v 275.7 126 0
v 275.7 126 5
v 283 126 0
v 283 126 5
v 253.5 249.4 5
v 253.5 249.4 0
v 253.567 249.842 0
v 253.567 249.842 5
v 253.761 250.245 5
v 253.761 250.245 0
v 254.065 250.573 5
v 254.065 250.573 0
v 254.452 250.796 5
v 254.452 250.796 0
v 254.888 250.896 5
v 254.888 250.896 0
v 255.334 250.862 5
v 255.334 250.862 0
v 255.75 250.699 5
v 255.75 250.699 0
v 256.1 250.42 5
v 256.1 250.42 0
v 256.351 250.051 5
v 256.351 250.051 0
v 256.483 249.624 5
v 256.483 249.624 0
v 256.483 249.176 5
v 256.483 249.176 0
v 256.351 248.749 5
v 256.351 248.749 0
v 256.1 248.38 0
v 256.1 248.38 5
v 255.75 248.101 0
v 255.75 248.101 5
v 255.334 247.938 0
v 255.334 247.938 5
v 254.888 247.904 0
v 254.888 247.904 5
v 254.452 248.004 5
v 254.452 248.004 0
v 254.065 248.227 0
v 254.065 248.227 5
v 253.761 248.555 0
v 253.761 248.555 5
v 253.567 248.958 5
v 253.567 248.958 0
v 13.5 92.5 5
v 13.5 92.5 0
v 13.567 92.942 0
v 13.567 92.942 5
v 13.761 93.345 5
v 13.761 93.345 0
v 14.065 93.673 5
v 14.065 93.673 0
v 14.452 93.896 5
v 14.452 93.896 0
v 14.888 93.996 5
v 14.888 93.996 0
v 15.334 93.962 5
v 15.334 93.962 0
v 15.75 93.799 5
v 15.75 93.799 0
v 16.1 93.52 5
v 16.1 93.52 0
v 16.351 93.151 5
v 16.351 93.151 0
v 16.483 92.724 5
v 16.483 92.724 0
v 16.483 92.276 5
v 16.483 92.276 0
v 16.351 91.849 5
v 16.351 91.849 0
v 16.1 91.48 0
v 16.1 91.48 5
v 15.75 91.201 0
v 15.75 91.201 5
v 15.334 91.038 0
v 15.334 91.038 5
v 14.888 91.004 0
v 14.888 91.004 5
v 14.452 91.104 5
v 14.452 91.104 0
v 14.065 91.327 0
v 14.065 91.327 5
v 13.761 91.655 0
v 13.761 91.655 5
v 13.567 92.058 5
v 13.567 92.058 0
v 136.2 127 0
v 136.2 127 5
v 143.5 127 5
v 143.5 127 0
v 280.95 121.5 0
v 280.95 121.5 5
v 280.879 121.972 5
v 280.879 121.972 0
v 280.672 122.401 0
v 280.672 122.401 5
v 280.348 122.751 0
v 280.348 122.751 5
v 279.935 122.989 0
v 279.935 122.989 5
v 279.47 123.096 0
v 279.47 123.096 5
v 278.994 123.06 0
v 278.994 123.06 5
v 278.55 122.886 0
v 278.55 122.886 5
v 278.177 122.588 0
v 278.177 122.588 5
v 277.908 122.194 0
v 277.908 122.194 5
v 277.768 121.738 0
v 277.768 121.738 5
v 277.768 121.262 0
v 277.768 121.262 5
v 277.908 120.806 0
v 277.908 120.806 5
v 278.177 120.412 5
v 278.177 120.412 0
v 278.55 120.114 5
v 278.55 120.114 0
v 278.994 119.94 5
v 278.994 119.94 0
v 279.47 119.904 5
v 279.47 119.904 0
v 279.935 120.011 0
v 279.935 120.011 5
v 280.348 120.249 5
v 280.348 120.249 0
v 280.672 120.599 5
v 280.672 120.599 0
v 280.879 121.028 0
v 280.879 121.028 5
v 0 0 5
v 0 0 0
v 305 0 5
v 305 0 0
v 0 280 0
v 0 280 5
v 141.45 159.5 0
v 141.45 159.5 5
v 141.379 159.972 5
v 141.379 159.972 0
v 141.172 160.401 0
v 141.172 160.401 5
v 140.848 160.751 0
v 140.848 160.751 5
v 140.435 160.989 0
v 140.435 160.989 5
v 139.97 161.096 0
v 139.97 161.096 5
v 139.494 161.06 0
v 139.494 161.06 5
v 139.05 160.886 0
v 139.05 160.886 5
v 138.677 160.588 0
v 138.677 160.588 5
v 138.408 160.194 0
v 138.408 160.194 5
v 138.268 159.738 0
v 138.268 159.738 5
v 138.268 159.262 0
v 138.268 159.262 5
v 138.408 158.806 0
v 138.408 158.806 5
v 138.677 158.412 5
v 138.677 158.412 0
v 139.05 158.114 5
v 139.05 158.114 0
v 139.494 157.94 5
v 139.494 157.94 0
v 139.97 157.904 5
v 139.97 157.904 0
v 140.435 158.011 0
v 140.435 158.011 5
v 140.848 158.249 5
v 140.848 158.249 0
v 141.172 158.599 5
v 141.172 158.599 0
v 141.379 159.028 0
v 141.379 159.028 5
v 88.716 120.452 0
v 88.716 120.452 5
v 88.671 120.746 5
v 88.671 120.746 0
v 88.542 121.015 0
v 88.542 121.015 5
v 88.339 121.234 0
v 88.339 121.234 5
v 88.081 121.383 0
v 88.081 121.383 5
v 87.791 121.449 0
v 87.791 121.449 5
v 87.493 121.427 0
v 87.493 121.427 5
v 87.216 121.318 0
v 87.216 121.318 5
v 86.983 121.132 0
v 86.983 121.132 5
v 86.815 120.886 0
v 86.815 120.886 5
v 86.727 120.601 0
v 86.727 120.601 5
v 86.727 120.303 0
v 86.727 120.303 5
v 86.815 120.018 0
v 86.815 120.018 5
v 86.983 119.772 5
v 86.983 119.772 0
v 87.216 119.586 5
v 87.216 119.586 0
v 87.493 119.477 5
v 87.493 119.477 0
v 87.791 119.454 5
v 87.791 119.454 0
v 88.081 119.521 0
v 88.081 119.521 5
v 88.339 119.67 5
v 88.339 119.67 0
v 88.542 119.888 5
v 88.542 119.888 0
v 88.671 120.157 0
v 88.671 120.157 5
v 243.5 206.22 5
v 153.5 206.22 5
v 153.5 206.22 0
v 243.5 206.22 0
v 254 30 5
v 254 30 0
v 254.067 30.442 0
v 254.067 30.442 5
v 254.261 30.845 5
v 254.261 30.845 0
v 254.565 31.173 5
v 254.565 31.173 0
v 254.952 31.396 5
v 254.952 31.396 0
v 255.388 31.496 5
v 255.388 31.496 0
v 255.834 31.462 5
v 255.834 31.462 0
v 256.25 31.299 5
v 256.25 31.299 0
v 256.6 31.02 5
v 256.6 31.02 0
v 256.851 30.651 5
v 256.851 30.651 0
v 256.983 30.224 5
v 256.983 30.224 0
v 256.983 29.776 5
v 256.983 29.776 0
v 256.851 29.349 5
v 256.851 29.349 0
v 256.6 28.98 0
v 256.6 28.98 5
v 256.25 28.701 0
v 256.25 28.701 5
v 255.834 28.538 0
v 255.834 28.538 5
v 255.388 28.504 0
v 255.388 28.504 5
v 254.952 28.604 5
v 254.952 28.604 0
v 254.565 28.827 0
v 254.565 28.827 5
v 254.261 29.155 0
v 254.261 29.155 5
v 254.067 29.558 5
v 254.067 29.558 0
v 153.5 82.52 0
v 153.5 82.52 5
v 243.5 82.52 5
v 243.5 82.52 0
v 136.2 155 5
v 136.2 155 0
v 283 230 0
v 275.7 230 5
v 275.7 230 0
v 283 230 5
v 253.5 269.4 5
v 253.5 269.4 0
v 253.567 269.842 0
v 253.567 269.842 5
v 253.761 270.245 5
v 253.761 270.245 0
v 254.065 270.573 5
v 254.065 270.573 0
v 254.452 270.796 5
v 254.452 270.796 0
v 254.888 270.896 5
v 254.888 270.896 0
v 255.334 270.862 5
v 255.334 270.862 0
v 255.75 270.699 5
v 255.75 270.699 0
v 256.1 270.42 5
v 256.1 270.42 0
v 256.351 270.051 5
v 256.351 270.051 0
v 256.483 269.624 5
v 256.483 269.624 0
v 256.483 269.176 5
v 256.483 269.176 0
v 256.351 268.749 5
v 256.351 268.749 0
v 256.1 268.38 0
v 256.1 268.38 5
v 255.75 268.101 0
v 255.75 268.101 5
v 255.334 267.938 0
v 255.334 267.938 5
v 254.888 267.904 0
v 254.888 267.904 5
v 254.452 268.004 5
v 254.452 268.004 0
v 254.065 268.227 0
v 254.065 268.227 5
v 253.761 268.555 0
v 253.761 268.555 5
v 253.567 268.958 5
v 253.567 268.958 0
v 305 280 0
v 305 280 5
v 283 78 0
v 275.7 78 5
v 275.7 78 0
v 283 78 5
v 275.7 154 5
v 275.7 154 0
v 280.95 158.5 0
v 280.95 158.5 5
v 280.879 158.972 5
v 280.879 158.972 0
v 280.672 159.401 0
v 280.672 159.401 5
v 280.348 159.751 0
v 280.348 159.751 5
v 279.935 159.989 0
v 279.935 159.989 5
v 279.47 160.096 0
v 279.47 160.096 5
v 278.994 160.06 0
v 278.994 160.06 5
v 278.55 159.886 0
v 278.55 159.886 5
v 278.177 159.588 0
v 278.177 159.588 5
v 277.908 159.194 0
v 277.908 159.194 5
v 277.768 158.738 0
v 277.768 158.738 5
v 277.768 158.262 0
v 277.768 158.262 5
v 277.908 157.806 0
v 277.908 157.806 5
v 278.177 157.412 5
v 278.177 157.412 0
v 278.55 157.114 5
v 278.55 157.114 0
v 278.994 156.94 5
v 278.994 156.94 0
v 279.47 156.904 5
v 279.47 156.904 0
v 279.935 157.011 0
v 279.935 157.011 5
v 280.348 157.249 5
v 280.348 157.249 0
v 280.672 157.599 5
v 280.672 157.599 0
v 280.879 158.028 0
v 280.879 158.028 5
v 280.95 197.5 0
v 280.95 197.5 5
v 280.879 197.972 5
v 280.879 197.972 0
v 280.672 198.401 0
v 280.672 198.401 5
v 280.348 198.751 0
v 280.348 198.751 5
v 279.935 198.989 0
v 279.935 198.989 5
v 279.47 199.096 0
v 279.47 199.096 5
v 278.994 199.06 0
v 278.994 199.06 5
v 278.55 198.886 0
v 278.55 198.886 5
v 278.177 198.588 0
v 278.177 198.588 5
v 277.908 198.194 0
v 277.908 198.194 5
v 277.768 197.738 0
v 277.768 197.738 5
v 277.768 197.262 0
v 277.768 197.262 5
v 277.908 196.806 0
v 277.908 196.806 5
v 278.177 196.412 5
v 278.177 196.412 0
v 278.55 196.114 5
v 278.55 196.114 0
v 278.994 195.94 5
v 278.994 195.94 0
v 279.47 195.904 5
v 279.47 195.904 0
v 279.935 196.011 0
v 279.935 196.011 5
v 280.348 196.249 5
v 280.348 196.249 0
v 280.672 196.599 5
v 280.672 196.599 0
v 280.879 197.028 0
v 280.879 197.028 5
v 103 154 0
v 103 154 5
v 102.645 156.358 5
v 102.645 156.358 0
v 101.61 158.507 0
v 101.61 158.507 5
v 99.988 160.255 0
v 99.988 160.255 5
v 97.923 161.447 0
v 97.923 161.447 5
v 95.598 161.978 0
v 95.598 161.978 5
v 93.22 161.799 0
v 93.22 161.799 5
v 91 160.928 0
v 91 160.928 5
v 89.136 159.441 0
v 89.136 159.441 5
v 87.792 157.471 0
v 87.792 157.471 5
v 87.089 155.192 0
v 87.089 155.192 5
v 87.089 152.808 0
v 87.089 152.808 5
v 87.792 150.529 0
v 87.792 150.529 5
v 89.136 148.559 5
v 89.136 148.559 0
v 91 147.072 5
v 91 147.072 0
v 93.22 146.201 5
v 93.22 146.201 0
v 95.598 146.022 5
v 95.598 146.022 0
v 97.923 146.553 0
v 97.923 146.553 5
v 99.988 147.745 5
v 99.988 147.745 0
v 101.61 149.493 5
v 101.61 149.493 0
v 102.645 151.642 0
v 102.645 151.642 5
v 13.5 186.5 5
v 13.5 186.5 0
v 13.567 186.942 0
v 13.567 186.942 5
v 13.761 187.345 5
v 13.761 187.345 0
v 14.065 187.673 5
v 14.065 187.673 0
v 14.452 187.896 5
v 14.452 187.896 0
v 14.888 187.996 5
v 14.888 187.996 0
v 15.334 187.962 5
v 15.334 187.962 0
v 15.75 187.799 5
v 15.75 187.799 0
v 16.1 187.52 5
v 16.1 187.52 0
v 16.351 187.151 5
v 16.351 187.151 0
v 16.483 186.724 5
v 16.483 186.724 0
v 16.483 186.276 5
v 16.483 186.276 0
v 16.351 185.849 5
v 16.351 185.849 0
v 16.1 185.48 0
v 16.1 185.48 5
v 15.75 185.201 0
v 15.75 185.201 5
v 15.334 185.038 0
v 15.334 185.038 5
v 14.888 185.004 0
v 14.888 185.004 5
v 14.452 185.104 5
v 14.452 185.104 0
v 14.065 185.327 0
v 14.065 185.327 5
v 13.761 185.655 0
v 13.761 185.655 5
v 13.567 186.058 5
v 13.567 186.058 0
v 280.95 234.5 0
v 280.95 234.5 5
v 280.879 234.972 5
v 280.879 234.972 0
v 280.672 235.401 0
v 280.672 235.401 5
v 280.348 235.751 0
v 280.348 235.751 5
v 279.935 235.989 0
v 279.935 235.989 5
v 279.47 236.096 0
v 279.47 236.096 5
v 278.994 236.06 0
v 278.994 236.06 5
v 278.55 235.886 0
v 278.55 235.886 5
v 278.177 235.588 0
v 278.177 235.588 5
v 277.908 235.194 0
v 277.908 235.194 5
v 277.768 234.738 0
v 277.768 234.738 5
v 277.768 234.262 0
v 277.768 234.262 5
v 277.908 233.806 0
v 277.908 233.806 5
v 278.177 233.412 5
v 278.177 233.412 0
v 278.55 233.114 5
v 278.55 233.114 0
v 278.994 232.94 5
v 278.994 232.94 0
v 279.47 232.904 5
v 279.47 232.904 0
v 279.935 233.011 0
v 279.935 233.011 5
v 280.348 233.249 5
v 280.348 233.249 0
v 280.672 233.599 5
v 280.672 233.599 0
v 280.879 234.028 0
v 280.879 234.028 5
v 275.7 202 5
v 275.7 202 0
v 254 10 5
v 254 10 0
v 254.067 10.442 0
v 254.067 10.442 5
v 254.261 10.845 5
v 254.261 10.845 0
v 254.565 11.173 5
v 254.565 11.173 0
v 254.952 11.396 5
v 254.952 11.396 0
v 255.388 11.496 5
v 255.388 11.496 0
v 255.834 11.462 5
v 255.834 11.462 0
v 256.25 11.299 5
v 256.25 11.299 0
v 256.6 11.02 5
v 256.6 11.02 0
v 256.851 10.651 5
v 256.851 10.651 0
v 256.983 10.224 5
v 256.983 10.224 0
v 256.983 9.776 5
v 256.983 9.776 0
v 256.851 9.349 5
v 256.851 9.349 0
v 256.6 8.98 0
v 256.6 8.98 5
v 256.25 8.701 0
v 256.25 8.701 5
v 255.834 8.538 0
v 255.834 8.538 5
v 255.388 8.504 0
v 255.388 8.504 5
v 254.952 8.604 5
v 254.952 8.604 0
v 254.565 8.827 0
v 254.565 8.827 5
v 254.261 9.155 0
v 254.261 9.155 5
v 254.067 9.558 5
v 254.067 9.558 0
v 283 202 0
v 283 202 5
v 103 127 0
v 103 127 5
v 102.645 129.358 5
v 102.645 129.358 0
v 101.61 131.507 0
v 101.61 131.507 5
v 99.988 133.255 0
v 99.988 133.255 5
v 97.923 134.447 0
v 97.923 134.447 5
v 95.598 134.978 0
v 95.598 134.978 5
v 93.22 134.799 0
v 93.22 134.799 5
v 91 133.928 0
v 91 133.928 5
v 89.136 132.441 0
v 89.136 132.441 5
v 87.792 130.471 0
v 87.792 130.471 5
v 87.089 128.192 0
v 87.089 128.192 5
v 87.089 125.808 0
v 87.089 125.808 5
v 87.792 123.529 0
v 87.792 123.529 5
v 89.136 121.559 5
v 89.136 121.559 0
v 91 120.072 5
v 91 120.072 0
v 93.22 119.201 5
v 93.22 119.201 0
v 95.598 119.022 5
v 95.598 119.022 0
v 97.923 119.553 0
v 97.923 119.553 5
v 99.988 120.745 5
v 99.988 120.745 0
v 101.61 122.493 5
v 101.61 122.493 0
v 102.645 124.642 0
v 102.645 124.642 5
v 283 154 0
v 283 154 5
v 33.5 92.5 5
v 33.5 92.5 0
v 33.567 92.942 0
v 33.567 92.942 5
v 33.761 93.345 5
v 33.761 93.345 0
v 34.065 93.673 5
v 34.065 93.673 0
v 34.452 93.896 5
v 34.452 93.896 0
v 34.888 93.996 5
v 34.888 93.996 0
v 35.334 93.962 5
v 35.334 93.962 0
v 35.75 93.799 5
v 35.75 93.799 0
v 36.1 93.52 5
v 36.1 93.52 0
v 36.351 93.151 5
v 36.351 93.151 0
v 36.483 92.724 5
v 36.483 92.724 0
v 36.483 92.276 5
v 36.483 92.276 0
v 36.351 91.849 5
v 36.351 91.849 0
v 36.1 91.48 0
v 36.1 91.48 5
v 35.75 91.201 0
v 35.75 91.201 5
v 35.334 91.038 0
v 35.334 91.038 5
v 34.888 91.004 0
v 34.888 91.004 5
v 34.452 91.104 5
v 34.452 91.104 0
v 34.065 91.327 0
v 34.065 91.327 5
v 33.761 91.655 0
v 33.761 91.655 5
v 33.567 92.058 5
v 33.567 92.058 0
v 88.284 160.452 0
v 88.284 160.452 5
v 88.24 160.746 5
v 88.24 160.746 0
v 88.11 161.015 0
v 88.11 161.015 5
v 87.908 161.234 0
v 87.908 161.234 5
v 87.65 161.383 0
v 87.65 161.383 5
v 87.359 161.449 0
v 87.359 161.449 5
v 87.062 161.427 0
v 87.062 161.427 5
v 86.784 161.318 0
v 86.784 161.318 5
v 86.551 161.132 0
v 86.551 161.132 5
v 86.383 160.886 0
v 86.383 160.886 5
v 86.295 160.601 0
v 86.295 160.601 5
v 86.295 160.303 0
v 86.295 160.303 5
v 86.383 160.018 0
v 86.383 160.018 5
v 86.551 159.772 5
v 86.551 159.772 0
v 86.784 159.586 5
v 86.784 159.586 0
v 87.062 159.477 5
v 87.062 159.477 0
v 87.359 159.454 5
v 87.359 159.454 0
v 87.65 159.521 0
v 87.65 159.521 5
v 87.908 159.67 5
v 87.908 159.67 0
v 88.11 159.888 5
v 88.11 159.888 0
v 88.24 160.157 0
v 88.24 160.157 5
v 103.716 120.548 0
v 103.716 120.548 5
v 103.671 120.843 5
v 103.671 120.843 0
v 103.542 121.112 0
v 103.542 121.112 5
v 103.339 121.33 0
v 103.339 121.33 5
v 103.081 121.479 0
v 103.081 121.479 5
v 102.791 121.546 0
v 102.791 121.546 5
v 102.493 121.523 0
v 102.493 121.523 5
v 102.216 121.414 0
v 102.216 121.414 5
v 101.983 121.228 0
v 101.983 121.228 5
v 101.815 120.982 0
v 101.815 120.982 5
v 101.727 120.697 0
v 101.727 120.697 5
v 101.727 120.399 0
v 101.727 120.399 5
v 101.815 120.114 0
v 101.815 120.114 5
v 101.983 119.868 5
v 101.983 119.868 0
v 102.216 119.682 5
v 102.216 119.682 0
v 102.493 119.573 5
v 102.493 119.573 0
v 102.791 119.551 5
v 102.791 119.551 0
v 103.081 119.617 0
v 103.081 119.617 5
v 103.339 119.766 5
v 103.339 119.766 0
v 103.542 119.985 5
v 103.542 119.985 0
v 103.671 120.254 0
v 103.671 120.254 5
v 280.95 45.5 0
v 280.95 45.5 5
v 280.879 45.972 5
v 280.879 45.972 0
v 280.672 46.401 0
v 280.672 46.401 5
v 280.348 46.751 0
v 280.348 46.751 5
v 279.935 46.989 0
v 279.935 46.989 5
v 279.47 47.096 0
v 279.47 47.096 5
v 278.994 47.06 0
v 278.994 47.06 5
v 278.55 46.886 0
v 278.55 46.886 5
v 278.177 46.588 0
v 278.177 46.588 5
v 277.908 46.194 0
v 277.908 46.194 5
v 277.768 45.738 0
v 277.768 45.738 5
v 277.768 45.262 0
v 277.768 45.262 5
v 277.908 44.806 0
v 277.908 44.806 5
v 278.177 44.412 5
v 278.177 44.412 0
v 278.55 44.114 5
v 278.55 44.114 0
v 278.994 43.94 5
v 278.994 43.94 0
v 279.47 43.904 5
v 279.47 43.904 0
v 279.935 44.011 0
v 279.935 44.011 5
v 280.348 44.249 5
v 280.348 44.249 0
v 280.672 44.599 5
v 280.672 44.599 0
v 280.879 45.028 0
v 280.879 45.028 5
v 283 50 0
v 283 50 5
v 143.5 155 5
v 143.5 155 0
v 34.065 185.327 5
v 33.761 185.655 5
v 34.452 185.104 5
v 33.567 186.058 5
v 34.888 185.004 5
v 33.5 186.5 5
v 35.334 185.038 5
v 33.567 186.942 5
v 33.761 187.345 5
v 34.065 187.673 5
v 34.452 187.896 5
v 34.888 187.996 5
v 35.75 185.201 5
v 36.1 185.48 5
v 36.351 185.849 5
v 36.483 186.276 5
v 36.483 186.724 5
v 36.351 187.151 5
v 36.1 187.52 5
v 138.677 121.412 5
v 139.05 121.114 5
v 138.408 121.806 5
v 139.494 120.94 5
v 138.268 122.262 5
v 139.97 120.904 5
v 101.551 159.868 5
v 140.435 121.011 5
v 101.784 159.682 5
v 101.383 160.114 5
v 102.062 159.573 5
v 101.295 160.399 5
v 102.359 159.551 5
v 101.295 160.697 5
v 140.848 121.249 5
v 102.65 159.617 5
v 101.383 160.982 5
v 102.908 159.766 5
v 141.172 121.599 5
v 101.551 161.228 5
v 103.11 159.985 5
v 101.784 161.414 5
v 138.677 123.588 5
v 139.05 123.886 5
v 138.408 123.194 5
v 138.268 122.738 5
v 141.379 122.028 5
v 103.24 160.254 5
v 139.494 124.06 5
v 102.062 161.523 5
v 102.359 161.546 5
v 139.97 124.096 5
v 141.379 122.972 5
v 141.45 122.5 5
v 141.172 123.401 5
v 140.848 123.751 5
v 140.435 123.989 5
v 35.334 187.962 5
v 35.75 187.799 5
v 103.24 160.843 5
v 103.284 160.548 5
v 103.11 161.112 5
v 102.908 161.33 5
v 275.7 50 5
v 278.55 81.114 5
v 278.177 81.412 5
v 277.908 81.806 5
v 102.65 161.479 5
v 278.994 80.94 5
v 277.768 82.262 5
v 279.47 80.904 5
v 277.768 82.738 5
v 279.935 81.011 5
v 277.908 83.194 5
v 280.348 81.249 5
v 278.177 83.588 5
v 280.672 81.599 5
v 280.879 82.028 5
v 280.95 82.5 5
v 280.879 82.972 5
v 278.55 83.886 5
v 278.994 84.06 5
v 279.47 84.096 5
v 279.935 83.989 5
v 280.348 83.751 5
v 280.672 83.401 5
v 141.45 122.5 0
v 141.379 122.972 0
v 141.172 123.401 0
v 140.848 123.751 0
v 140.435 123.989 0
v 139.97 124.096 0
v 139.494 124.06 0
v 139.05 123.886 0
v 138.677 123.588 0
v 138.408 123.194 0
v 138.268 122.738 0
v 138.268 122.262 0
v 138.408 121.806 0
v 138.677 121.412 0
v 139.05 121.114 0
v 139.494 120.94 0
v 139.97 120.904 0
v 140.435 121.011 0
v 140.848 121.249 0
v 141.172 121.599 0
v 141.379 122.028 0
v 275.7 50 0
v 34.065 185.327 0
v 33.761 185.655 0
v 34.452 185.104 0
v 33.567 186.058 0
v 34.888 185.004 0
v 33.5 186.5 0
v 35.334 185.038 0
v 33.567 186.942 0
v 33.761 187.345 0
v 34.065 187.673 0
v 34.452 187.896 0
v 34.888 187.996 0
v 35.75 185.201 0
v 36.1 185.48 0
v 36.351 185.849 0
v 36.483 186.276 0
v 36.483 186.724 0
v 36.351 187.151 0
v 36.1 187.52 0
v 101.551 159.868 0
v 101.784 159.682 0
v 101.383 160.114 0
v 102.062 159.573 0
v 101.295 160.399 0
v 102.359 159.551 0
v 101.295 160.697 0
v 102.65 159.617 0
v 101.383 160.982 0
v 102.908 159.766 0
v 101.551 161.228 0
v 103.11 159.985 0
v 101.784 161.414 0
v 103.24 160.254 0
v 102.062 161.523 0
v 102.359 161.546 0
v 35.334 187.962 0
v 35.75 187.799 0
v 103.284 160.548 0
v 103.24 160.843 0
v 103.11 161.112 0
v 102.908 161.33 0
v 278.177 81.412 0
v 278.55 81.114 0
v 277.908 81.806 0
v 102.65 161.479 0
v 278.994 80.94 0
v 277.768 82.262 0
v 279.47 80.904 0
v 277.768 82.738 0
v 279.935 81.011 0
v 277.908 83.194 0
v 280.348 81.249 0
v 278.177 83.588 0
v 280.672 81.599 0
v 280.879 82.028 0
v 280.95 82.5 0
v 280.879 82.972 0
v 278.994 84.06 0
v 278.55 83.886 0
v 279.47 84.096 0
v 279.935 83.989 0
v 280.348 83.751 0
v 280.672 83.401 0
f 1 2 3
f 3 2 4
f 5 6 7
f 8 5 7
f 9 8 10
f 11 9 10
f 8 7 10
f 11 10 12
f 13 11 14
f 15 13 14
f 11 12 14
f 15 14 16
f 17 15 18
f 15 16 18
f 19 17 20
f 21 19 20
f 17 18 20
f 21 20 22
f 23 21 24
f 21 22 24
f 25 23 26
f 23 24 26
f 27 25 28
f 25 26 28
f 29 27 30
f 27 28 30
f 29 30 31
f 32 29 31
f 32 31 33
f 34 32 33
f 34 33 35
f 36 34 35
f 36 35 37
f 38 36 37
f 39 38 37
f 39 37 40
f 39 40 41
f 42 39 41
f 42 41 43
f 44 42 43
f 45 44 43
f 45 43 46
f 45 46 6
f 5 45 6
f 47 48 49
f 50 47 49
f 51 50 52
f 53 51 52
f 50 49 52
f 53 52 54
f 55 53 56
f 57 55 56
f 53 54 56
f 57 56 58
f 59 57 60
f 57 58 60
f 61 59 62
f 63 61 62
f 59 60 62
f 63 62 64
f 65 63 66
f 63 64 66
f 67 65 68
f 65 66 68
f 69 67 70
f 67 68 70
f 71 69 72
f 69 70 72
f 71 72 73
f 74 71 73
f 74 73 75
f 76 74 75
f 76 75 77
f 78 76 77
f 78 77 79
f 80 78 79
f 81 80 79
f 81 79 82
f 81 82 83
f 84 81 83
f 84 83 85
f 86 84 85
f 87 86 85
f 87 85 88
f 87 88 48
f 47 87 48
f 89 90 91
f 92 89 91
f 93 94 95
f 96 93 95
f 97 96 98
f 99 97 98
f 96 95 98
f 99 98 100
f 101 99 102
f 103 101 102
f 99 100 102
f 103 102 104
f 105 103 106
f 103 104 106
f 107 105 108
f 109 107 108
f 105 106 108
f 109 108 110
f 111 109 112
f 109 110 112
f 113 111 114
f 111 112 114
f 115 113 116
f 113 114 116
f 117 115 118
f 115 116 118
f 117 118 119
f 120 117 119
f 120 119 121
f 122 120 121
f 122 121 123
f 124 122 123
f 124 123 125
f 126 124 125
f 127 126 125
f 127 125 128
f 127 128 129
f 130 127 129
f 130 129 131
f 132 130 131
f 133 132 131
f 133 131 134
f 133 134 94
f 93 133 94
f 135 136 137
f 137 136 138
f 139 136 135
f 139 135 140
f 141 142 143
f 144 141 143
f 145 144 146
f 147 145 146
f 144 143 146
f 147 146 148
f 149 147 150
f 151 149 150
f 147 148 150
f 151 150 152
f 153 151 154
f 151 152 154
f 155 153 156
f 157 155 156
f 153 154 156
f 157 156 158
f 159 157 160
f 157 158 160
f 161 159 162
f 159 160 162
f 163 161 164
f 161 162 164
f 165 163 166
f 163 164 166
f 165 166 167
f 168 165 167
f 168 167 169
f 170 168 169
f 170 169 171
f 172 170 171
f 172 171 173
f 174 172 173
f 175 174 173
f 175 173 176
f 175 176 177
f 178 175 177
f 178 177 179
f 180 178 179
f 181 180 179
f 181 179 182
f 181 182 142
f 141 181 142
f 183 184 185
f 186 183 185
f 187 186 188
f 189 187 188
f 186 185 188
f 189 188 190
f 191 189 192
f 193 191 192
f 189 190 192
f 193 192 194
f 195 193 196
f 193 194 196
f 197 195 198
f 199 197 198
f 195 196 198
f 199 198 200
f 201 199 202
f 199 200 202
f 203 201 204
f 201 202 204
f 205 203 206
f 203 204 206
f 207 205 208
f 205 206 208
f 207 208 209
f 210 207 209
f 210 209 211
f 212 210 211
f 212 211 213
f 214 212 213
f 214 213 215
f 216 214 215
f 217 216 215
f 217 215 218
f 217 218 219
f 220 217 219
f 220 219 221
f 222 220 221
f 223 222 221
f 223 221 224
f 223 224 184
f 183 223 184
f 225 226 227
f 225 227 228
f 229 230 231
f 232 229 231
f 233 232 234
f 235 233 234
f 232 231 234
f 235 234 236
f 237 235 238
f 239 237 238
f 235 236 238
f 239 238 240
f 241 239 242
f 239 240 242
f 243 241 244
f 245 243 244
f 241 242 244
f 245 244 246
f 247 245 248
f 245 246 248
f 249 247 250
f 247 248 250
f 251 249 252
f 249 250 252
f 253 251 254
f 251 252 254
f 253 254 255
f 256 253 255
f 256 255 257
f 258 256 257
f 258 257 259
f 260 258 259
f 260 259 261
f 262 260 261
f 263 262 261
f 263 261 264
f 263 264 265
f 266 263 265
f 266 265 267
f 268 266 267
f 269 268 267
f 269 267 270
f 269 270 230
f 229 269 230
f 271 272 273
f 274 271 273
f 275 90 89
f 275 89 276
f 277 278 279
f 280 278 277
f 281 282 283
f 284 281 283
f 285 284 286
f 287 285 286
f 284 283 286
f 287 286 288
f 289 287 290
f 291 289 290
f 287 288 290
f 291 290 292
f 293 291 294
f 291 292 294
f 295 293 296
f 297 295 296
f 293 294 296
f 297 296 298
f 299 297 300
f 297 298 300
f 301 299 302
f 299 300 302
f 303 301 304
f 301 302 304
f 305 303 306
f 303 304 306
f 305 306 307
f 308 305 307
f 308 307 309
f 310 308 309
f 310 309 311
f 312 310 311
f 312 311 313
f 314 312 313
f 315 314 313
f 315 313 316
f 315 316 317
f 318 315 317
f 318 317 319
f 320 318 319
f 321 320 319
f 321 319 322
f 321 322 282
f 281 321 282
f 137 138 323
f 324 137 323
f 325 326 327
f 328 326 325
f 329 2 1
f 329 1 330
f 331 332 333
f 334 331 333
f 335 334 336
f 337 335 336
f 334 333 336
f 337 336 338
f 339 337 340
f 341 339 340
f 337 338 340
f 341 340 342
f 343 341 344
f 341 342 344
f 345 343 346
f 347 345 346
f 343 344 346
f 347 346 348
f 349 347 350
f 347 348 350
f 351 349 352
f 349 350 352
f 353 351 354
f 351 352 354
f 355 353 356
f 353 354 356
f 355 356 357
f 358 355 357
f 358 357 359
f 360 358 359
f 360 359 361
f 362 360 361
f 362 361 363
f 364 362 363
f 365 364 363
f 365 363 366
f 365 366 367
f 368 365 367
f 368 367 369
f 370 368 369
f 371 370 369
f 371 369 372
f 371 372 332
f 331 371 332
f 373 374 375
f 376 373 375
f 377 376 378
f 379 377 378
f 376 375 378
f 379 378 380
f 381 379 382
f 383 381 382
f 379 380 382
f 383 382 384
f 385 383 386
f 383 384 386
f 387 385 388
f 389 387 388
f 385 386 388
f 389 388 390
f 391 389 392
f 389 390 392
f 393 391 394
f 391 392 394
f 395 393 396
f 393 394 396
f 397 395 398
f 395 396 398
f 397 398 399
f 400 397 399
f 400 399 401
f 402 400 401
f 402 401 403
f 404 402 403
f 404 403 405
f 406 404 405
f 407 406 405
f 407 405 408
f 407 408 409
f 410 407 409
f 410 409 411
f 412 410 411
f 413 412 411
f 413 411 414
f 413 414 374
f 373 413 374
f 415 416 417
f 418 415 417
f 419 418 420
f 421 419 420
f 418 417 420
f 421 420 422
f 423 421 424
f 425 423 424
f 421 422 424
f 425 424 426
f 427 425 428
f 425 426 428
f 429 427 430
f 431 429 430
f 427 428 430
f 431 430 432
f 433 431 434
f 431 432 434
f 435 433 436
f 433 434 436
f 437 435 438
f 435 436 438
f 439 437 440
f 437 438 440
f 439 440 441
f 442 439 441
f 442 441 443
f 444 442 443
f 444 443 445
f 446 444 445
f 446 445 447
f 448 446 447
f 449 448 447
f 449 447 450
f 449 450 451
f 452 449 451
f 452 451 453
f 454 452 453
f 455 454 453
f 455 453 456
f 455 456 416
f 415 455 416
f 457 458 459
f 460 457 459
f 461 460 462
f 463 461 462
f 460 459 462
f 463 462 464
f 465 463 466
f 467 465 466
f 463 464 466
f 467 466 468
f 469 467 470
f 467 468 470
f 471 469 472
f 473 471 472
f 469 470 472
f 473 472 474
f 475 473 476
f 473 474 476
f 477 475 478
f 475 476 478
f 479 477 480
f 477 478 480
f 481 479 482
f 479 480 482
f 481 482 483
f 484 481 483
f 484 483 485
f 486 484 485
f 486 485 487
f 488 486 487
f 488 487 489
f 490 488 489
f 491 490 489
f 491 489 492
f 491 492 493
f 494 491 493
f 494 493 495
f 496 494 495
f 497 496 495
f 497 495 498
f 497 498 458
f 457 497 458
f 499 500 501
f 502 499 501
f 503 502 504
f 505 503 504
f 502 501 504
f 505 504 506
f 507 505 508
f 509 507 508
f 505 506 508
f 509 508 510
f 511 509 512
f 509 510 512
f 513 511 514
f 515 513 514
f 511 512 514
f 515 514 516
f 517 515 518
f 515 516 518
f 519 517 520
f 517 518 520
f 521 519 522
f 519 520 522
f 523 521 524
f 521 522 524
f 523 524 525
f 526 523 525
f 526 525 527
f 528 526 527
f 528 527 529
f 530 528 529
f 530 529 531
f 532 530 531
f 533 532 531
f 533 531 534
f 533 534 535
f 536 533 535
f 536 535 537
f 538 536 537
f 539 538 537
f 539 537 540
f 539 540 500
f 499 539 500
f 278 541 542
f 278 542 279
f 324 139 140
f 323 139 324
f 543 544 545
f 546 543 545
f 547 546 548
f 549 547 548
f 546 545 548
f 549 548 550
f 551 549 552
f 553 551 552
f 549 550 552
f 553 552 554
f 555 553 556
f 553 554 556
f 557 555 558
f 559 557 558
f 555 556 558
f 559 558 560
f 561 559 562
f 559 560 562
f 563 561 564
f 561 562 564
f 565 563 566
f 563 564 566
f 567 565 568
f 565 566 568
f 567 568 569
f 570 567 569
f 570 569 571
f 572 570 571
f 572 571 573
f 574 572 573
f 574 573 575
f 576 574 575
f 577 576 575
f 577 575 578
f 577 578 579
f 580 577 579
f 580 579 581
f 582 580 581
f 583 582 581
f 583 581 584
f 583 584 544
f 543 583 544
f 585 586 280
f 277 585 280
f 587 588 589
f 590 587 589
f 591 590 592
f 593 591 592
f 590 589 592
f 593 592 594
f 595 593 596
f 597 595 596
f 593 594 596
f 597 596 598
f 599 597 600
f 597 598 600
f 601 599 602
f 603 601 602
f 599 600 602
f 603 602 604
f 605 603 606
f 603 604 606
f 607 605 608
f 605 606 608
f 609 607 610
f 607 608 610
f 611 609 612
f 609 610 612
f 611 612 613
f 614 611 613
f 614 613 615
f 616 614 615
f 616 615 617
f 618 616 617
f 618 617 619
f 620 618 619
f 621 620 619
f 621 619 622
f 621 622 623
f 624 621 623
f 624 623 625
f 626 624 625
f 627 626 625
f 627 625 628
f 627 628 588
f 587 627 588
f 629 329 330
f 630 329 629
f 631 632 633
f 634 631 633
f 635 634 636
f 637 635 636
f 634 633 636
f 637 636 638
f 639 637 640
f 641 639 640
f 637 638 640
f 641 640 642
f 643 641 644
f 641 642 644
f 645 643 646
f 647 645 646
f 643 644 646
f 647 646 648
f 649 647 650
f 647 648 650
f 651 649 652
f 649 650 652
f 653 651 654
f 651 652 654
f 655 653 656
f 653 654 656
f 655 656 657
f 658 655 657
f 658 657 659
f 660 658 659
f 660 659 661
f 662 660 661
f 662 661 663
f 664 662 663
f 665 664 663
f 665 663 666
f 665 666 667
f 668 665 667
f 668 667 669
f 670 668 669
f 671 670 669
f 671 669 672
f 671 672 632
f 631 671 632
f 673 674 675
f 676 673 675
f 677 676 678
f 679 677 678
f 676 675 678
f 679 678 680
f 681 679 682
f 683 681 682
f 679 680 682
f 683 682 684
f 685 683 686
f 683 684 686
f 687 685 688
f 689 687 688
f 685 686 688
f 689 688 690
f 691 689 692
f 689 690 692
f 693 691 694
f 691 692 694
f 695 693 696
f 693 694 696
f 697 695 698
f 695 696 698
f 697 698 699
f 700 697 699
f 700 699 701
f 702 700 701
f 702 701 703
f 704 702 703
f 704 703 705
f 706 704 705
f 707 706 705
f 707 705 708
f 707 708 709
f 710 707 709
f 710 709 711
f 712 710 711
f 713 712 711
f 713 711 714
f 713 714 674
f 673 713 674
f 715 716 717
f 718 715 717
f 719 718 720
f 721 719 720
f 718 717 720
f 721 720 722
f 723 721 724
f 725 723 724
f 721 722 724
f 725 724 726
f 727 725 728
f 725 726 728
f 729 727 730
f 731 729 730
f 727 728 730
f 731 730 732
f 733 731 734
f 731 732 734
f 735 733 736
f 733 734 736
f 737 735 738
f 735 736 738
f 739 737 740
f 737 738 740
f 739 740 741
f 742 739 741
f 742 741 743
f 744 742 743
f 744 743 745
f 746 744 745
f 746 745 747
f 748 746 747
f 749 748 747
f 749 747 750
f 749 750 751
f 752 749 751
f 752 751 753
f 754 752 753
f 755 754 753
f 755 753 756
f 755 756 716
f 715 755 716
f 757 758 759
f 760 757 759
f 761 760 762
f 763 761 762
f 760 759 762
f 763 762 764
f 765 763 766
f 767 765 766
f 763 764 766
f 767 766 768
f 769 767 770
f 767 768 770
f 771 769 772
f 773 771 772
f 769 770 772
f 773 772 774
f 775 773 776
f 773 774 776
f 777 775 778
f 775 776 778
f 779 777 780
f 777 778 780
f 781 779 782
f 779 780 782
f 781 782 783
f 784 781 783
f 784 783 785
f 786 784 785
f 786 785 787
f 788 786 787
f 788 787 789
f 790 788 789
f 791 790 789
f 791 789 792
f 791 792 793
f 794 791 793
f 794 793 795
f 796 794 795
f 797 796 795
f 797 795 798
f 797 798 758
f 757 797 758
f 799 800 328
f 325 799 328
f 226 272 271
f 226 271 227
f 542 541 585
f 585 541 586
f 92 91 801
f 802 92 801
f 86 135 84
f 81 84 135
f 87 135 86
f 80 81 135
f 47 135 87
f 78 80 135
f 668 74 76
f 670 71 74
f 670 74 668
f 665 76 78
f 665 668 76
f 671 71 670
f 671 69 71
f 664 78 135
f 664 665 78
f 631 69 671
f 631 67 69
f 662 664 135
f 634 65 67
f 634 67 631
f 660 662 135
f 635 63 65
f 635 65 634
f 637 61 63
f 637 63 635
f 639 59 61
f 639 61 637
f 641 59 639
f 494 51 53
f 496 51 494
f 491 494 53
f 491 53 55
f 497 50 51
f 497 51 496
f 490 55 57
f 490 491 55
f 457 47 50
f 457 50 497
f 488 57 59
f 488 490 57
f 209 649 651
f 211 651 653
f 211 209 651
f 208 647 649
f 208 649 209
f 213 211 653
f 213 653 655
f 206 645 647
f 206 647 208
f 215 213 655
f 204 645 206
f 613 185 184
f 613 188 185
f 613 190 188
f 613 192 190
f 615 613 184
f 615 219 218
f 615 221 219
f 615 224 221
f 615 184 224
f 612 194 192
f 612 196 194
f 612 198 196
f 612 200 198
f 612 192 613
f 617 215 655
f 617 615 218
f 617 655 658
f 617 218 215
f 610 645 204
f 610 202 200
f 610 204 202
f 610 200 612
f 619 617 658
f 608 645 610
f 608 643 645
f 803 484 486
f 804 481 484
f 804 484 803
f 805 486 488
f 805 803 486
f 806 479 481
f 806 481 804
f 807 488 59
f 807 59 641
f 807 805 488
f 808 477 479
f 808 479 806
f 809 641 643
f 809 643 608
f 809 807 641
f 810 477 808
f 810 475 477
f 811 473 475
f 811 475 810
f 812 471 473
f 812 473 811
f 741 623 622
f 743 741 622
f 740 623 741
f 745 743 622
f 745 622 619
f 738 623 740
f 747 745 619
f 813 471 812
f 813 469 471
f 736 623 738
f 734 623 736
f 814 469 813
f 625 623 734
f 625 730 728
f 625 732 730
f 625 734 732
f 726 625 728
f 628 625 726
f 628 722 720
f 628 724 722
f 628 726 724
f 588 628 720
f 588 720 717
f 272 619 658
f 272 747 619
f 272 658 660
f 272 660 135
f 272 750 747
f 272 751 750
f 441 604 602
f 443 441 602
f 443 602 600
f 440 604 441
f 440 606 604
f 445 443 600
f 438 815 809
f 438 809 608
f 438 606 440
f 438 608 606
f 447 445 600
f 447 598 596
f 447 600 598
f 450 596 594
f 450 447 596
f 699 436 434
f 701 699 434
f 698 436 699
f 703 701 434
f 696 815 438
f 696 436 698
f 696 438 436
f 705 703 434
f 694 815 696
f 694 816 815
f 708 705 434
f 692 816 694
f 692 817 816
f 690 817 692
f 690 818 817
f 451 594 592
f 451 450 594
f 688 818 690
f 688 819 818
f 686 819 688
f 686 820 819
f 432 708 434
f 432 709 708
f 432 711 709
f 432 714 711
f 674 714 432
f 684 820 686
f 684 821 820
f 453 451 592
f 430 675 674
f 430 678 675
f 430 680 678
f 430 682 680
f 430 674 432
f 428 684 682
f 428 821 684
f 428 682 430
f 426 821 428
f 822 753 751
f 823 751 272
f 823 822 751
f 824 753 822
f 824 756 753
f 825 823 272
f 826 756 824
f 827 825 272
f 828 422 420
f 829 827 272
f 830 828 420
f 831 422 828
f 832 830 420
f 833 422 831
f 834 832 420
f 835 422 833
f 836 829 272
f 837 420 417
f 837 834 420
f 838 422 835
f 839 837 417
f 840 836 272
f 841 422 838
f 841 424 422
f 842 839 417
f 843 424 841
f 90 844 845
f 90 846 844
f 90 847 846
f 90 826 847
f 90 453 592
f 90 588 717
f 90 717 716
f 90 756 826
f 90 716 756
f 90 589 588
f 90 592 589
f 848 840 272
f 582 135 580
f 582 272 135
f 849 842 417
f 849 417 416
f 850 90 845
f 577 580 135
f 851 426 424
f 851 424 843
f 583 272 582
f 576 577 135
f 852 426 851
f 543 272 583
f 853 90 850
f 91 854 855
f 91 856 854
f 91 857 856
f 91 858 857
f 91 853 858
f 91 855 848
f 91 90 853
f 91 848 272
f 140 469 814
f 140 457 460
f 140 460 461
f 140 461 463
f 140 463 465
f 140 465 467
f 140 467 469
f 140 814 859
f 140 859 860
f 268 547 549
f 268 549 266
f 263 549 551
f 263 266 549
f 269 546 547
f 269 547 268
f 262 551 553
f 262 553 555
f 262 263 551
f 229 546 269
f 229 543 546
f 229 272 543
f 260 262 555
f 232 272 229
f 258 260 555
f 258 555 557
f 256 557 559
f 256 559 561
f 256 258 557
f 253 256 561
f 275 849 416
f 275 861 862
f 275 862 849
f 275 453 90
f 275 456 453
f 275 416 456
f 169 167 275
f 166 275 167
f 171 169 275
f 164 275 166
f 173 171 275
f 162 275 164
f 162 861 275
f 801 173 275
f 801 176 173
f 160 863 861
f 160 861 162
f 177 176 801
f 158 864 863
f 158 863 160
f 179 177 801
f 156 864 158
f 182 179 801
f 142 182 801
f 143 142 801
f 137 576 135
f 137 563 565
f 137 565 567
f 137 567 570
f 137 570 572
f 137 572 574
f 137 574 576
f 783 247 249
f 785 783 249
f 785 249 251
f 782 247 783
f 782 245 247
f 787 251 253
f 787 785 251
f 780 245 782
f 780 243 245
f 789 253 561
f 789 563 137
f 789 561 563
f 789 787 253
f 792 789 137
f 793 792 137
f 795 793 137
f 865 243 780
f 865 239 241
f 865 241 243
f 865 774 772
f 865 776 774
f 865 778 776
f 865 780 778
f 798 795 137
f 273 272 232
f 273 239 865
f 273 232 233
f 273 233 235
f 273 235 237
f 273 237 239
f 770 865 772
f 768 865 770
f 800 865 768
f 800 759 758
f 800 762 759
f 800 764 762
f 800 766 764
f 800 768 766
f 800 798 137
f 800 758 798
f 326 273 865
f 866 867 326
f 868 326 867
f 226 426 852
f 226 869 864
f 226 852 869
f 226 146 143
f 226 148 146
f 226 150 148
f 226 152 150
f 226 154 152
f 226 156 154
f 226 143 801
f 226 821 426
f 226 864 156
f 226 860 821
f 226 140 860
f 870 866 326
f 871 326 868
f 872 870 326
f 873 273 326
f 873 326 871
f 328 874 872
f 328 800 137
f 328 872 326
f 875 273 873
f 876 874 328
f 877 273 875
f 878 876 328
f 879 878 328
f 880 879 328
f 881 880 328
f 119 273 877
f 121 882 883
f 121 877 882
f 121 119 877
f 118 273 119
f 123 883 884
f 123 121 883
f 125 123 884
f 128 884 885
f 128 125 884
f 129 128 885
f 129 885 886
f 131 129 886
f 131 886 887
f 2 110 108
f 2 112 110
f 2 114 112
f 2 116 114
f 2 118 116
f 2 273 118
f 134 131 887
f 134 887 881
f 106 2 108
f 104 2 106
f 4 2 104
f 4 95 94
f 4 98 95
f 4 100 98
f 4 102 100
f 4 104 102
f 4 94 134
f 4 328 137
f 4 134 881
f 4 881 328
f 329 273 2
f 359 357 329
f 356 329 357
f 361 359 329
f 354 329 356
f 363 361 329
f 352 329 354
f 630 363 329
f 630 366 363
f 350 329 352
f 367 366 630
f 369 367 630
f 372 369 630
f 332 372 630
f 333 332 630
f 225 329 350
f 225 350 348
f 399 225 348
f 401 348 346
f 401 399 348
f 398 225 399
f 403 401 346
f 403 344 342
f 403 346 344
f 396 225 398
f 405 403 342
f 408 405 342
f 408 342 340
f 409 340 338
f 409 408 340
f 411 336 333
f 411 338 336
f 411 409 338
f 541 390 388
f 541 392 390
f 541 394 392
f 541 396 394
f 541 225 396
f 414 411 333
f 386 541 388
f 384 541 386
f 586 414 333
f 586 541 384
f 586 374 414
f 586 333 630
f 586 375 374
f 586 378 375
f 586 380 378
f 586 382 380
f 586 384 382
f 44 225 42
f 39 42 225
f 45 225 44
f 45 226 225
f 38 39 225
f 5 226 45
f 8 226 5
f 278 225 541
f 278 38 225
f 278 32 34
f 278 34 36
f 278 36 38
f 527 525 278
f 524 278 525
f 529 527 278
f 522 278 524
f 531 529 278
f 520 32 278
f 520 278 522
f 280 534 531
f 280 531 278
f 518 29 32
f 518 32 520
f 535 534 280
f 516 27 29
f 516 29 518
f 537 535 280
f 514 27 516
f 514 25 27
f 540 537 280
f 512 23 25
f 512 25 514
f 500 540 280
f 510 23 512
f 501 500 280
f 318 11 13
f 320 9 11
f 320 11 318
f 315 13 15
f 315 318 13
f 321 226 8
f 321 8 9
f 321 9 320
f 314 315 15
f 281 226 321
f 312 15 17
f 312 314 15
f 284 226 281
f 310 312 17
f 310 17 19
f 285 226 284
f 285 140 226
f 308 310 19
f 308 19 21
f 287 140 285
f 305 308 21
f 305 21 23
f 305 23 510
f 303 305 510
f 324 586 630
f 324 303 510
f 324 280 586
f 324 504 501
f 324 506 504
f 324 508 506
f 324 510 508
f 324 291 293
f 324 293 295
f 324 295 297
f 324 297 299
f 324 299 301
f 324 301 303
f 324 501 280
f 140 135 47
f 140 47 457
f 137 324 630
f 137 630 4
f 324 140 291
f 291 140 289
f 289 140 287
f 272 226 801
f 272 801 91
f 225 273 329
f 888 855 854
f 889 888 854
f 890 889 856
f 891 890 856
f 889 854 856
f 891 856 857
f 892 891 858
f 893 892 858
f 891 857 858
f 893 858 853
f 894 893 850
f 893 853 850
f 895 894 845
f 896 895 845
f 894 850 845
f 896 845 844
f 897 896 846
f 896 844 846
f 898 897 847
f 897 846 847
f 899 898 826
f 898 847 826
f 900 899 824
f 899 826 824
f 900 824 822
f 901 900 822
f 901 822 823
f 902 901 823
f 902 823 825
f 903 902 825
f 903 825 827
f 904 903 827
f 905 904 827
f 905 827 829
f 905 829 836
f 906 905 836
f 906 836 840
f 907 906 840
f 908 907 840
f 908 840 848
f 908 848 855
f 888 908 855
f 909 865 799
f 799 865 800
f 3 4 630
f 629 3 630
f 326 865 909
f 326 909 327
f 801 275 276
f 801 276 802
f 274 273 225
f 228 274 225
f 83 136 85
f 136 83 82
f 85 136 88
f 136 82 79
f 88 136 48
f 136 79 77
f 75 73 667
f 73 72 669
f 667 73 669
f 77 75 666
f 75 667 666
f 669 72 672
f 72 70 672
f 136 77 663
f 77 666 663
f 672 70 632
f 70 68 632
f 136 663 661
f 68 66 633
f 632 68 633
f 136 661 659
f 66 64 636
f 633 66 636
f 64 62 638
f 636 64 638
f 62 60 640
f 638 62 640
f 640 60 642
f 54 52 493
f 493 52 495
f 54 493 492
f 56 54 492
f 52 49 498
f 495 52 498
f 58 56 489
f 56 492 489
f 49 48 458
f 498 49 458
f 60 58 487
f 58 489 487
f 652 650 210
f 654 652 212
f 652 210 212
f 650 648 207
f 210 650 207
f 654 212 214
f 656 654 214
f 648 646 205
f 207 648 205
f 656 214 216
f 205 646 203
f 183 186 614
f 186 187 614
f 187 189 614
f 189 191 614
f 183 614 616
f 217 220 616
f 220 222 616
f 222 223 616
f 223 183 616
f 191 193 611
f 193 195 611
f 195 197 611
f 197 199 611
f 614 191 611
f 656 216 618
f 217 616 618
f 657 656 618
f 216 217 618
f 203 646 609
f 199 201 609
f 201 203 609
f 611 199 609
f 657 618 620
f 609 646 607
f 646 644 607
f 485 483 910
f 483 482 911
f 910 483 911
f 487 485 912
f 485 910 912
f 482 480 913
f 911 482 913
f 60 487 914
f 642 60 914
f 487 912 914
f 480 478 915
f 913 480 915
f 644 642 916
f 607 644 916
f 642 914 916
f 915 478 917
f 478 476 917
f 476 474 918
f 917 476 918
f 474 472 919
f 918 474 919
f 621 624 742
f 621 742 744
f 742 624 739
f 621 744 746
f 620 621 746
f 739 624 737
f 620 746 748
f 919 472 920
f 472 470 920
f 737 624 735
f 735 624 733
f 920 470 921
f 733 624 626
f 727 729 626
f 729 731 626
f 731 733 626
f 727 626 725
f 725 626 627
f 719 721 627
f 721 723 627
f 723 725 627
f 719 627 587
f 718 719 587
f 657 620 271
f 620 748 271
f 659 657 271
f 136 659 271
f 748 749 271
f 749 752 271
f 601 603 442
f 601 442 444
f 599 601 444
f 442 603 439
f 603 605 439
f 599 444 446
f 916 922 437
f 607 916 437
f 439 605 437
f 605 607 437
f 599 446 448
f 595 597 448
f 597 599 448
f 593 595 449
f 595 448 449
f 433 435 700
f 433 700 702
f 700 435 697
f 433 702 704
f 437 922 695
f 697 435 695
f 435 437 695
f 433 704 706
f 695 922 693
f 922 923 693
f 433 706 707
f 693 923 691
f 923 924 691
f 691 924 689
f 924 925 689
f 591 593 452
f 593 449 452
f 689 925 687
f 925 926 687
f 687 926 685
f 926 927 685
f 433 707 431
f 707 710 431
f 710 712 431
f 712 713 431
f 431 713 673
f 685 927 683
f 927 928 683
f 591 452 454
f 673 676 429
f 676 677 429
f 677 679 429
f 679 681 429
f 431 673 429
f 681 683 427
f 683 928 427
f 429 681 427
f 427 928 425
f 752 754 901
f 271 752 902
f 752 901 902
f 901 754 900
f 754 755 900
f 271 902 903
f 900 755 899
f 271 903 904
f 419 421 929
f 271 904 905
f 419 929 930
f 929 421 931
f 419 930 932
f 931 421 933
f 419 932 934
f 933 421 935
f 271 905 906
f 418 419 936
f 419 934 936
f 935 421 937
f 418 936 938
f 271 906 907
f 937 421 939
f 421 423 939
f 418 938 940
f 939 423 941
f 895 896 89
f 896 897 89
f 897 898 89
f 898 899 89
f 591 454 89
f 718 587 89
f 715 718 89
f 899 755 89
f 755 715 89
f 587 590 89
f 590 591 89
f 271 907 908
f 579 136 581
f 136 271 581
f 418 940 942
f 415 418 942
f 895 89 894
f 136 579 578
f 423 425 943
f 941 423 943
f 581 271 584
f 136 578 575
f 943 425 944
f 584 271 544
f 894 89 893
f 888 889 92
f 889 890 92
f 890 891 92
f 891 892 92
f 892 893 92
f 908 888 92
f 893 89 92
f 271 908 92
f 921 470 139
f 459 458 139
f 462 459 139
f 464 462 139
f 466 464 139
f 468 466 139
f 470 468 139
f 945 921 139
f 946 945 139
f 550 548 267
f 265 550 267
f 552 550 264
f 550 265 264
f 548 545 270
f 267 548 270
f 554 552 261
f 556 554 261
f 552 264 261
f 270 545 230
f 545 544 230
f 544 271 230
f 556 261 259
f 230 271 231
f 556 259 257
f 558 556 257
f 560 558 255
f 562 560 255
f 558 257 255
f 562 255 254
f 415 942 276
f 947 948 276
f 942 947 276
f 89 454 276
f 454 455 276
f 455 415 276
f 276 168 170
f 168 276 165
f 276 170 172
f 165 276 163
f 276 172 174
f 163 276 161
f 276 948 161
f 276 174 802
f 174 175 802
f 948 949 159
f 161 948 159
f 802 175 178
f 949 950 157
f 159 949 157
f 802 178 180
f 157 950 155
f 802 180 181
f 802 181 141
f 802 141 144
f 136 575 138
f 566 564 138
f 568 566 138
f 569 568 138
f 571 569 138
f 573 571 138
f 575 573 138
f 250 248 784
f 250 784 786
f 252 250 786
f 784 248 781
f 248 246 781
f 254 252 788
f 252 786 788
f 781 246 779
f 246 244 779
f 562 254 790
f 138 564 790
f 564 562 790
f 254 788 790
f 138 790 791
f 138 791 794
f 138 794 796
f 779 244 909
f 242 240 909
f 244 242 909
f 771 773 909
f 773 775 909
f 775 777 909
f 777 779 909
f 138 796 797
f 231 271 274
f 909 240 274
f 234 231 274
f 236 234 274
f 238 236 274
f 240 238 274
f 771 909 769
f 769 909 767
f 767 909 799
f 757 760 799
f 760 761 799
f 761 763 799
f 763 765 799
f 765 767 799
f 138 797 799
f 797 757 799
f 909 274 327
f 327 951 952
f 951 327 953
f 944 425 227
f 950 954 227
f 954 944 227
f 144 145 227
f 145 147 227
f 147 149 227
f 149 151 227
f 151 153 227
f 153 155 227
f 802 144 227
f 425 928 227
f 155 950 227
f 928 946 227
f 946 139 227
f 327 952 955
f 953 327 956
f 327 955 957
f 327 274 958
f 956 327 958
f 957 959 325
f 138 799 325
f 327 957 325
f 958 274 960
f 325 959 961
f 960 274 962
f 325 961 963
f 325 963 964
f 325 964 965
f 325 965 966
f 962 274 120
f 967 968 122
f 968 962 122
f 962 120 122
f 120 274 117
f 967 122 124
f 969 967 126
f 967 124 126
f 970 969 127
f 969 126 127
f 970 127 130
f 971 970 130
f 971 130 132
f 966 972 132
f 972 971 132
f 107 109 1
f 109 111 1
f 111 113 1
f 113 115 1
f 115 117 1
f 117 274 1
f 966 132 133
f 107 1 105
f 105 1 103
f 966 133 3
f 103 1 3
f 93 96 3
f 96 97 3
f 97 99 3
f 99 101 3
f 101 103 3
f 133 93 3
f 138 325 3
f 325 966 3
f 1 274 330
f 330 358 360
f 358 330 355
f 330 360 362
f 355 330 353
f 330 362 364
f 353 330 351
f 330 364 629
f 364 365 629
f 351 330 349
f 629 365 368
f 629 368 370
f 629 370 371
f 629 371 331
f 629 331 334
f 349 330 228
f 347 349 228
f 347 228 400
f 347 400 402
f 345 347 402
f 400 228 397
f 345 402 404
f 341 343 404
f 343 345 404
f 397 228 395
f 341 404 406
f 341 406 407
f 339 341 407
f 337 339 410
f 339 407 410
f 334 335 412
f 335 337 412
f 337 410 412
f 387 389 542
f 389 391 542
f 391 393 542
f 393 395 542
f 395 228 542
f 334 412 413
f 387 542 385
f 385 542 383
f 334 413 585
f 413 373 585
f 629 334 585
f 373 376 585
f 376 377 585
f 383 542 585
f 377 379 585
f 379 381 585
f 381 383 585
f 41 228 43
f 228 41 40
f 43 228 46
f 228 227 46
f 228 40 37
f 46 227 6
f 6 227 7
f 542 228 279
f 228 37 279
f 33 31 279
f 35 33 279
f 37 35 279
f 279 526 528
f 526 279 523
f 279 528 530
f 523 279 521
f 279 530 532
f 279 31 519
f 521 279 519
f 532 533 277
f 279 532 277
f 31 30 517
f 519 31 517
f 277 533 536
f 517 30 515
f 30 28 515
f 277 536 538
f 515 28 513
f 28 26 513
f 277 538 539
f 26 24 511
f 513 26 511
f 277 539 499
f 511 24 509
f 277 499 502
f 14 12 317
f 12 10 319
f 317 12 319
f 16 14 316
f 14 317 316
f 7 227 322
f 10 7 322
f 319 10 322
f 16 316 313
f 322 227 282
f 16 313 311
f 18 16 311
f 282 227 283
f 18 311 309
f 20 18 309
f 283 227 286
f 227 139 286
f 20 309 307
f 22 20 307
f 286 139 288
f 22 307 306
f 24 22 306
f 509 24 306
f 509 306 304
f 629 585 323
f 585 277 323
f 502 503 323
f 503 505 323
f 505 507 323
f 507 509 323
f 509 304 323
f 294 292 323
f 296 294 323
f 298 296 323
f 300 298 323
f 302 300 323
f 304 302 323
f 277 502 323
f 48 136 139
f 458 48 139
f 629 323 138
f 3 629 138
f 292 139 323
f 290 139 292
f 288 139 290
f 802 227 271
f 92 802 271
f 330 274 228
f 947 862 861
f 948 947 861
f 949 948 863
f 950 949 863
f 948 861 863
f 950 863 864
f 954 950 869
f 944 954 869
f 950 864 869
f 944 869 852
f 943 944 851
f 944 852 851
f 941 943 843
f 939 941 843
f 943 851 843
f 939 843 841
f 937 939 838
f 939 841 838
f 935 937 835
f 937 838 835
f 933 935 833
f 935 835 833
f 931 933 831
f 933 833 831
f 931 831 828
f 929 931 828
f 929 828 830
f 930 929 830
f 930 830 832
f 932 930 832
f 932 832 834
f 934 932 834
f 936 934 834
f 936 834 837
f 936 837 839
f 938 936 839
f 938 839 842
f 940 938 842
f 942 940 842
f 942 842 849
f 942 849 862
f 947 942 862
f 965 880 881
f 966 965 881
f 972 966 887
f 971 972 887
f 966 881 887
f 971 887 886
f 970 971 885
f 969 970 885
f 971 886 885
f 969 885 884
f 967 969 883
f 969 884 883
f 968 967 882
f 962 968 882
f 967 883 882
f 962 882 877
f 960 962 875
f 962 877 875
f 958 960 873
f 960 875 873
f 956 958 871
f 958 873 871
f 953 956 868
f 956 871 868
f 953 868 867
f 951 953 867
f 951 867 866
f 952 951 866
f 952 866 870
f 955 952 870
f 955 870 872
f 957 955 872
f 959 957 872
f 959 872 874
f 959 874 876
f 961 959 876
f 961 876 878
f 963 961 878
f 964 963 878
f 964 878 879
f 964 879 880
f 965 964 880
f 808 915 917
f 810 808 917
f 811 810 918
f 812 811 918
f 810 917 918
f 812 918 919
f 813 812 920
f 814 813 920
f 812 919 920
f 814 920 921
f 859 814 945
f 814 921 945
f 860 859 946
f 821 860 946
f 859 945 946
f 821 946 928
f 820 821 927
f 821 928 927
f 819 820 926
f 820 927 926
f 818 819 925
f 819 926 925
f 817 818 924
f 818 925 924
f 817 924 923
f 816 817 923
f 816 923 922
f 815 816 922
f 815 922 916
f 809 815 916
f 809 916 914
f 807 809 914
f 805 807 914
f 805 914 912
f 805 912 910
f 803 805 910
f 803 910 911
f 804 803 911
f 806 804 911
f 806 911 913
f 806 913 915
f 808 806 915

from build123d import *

# Parameters (mm, degrees)
ESQUISSE1_W             = 305
ESQUISSE1_H             = 280
BOSS_EXTRU_1_DEPTH      = 5
ESQUISSE2_W             = 90
ESQUISSE2_H             = 123.7
ENL_V_MAT_EXTRU_1_DEPTH = 5
ESQUISSE3_R             = 1.5
ENL_V_MAT_EXTRU_2_DEPTH = 415.065212255
ESQUISSE4_R             = 1.6
ESQUISSE4_W             = 7.3
ESQUISSE4_H             = 28
ENL_V_MAT_EXTRU_3_DEPTH = 415.065212255
ESQUISSE5_R             = 8
ESQUISSE5_R_2           = 1
ENL_V_MAT_EXTRU_4_DEPTH = 415.065212255


with BuildPart() as part:
    # Esquisse1 → Boss.-Extru.1 (new body)
    with BuildSketch(Plane.XY):
        with Locations((152.5, 140)):
            Rectangle(ESQUISSE1_W, ESQUISSE1_H)
    extrude(amount=BOSS_EXTRU_1_DEPTH)

    # Esquisse2 → Enlèv. mat.-Extru.1 (cut)
    with BuildSketch(Plane.XY.offset(5)):
        with Locations((198.5, 144.37)):
            Rectangle(ESQUISSE2_W, ESQUISSE2_H)
    extrude(amount=-ENL_V_MAT_EXTRU_1_DEPTH, mode=Mode.SUBTRACT)

    # Esquisse3 → Enlèv. mat.-Extru.2 (cut, through all)
    with BuildSketch(Plane(origin=(0, 0, 0), x_dir=(-1, 0, 0), z_dir=(0, 0, -1))):
        with Locations((-15, 92.5)):
            Circle(ESQUISSE3_R)
        with Locations((-35, 92.5)):
            Circle(ESQUISSE3_R)
        with Locations((-35, 186.5)):
            Circle(ESQUISSE3_R)
        with Locations((-15, 186.5)):
            Circle(ESQUISSE3_R)
        with Locations((-255, 249.4)):
            Circle(ESQUISSE3_R)
        with Locations((-255, 269.4)):
            Circle(ESQUISSE3_R)
        with Locations((-255.5, 10)):
            Circle(ESQUISSE3_R)
        with Locations((-255.5, 30)):
            Circle(ESQUISSE3_R)
    extrude(amount=-ENL_V_MAT_EXTRU_2_DEPTH, mode=Mode.SUBTRACT)

    # Esquisse4 → Enlèv. mat.-Extru.3 (cut, through all)
    with BuildSketch(Plane.XY.offset(5)):
        with Locations((139.85, 159.5)):
            Circle(ESQUISSE4_R)
        with Locations((139.85, 122.5)):
            Circle(ESQUISSE4_R)
        with Locations((279.35, 82.5)):
            Circle(ESQUISSE4_R)
        with Locations((279.35, 45.5)):
            Circle(ESQUISSE4_R)
        with Locations((279.35, 121.5)):
            Circle(ESQUISSE4_R)
        with Locations((279.35, 158.5)):
            Circle(ESQUISSE4_R)
        with Locations((279.35, 197.5)):
            Circle(ESQUISSE4_R)
        with Locations((279.35, 234.5)):
            Circle(ESQUISSE4_R)
        with Locations((279.35, 64)):
            Rectangle(ESQUISSE4_W, ESQUISSE4_H)
        with Locations((279.35, 140)):
            Rectangle(ESQUISSE4_W, ESQUISSE4_H)
        with Locations((279.35, 216)):
            Rectangle(ESQUISSE4_W, ESQUISSE4_H)
        with Locations((139.85, 141)):
            Rectangle(ESQUISSE4_W, ESQUISSE4_H)
    extrude(amount=-ENL_V_MAT_EXTRU_3_DEPTH, mode=Mode.SUBTRACT)

    # Esquisse5 → Enlèv. mat.-Extru.4 (cut, through all)
    with BuildSketch(Plane.XY.offset(5)):
        with Locations((95, 127)):
            Circle(ESQUISSE5_R)
        with Locations((95, 154)):
            Circle(ESQUISSE5_R)
        with Locations((87.715791554, 120.451688458)):
            Circle(ESQUISSE5_R_2)
        with Locations((87.284208446, 160.451688458)):
            Circle(ESQUISSE5_R_2)
        with Locations((102.284208446, 160.548311542)):
            Circle(ESQUISSE5_R_2)
        with Locations((102.715791554, 120.548311542)):
            Circle(ESQUISSE5_R_2)
    extrude(amount=-ENL_V_MAT_EXTRU_4_DEPTH, mode=Mode.SUBTRACT)


solid = part.part
